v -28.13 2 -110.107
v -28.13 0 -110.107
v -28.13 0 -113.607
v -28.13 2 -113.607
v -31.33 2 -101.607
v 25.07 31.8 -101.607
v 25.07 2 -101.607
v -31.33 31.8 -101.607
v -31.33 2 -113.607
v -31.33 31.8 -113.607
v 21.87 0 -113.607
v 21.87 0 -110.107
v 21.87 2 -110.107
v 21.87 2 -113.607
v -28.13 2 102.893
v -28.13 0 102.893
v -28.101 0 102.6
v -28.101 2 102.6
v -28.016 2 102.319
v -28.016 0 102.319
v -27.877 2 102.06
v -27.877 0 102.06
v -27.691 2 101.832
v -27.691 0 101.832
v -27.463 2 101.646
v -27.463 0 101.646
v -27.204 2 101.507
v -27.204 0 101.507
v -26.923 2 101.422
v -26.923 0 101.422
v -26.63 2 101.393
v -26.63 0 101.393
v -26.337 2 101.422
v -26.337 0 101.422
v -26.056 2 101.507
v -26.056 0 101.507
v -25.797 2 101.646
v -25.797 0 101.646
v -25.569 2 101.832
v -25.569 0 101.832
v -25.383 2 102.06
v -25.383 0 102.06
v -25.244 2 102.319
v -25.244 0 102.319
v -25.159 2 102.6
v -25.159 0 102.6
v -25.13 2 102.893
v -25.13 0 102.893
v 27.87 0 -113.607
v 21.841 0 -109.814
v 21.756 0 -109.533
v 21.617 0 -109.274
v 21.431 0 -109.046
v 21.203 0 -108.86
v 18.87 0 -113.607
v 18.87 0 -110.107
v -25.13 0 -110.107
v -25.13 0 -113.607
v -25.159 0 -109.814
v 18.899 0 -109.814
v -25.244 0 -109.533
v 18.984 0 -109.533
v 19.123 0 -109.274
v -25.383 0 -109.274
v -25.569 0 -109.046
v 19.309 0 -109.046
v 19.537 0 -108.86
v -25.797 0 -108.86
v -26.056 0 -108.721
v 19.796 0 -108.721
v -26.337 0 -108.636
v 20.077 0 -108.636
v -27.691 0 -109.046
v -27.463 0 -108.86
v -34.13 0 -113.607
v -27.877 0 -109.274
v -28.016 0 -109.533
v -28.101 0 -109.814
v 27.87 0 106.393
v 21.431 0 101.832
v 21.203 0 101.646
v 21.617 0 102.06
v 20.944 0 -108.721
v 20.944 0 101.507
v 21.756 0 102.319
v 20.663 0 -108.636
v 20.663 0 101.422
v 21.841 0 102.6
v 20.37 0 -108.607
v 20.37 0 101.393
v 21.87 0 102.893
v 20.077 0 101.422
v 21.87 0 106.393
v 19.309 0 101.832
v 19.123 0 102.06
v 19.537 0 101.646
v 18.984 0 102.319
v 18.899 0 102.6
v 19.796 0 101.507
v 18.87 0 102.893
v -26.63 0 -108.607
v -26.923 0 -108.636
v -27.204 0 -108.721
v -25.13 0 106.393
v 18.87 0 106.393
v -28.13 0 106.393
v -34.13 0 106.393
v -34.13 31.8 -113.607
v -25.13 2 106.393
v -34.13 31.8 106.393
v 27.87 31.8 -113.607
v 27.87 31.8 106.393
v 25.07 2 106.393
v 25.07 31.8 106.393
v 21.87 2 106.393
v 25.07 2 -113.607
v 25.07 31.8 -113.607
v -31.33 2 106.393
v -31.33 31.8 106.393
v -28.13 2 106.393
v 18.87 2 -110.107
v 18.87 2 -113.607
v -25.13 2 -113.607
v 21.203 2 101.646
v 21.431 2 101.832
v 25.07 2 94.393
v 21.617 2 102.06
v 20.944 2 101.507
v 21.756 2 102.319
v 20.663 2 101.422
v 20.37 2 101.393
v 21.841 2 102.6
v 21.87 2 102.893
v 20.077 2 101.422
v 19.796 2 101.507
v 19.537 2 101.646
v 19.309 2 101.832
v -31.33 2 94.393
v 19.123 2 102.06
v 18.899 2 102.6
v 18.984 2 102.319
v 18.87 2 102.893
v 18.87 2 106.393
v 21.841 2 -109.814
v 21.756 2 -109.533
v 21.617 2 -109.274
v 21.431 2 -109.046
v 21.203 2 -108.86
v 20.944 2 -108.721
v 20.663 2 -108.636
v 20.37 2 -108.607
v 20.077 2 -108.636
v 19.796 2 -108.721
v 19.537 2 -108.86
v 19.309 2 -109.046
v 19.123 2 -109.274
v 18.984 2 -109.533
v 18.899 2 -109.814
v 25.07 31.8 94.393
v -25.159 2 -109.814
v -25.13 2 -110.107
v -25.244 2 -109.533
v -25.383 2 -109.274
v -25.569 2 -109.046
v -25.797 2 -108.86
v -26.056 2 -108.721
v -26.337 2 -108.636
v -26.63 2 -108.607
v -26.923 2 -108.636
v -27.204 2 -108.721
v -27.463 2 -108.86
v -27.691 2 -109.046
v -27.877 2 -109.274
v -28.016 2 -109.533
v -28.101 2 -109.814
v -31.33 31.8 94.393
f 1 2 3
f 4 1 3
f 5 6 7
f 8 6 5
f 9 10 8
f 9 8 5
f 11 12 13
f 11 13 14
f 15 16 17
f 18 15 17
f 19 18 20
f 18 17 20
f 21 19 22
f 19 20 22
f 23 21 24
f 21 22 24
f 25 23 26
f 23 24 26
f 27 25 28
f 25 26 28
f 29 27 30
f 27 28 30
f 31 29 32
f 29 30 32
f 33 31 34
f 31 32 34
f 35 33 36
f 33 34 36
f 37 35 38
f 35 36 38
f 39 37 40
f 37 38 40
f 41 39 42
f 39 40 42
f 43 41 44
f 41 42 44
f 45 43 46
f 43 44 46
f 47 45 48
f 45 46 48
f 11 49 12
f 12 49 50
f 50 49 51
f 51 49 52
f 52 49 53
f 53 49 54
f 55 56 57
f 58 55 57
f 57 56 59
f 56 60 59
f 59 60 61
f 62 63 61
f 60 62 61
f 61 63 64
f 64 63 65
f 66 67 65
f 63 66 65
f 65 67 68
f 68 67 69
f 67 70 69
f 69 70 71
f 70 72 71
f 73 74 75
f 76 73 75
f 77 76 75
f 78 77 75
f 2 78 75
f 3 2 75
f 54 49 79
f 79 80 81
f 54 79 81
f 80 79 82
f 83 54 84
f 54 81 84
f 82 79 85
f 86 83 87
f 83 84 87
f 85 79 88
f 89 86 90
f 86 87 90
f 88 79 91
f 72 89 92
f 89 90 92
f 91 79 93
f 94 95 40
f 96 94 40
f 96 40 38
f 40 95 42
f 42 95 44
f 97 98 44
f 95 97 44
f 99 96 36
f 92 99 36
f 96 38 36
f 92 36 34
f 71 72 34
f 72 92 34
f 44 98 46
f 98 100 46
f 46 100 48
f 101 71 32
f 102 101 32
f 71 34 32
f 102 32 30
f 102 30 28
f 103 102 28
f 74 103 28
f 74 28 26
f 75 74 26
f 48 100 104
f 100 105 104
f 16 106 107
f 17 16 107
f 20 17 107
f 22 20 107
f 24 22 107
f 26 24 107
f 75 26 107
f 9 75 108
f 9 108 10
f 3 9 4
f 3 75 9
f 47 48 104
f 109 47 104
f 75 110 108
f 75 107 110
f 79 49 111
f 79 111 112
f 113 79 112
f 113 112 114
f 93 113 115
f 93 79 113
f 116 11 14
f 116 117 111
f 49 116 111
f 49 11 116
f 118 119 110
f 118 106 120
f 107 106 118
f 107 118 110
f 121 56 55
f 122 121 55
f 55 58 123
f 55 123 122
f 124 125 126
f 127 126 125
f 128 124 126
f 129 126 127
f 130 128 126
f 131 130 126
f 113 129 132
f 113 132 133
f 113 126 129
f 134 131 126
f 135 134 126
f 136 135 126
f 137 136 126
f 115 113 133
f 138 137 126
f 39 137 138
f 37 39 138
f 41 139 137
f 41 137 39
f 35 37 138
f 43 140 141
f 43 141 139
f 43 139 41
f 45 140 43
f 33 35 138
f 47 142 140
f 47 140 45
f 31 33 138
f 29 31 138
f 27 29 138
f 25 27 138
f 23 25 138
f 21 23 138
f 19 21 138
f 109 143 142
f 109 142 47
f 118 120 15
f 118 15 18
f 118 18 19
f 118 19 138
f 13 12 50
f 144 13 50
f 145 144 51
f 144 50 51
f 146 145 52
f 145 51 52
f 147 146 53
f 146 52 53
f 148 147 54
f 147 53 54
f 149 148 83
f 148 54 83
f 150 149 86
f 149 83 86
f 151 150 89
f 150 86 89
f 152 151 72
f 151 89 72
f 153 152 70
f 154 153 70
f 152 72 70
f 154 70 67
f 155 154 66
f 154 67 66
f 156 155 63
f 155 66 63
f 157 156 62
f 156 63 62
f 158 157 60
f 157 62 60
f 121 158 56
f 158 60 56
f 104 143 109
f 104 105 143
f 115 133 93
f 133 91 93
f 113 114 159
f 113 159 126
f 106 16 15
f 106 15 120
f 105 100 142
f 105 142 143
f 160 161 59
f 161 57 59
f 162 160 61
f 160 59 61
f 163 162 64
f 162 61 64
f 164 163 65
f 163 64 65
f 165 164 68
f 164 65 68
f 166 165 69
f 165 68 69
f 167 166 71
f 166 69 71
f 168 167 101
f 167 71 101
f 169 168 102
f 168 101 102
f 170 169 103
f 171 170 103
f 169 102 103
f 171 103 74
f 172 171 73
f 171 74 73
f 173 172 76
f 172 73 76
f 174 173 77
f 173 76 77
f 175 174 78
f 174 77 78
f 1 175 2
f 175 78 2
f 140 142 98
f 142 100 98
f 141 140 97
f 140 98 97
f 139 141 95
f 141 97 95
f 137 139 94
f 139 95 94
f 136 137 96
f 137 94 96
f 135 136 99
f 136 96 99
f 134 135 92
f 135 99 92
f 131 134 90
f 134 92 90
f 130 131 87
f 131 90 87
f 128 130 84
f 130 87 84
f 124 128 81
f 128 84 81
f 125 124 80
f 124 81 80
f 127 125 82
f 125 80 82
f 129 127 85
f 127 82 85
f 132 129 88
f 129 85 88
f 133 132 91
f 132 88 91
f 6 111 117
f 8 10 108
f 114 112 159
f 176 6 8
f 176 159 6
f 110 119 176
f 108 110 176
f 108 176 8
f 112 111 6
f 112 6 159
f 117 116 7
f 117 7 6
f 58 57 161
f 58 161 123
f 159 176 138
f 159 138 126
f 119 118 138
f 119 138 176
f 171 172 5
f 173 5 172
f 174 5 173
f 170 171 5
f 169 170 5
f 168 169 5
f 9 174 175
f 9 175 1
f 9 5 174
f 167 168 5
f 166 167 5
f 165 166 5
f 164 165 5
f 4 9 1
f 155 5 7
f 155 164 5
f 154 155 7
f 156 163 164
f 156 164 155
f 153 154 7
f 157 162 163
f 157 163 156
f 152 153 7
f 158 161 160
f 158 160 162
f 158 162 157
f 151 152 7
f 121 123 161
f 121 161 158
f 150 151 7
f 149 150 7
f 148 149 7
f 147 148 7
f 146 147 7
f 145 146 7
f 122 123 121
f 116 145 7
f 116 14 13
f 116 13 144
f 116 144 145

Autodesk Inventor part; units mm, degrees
ref_plane "YZ Plane" through (0, 0, 0) normal (1, 0, 0) x (0, 1, 0)
ref_plane "XZ Plane" through (0, 0, 0) normal (0, 1, 0) x (-1, 0, 0)
sketch "Sketch1" plane through (0, 0, 0) normal (0, 1, 0) x (-1, 0, 0)
  line L0 (34.1299, -113.6069) -> (-27.8701, -113.6069)
  line L1 (-27.8701, -113.6069) -> (-27.8701, 106.3931)
  line L2 (-27.8701, 106.3931) -> (34.1299, 106.3931)
  line L3 (34.1299, 106.3931) -> (34.1299, -113.6069)
  line L4 (34.1299, -113.6069) -> (-27.8701, 106.3931) construction
  line L5 (-27.8701, -113.6069) -> (34.1299, 106.3931) construction
  point P0 (0, 0)
  point P1 (3.1299, -3.6069)
  dimension "d0" = 62
  dimension "d1" = 220
extrude "Extrusion1" add sketch "Sketch1" along normal blind 31.8
sketch "Sketch2" plane through (-34.1299, 0, 106.3931) normal (0, 0, 1) x (1, 0, 0)
  line L0 (62, 0) -> (0, 0) projected
  line L1 (62, 0) -> (62, 31.8) projected
  line L2 (0, 0) -> (0, 31.8) projected
  line L3 (2.8, 38.8076) -> (59.2, 38.8076)
  line L4 (59.2, 38.8076) -> (59.2, 2)
  line L5 (59.2, 2) -> (2.8, 2)
  line L6 (2.8, 2) -> (2.8, 38.8076)
  point P0 (34.1299, 0)
  dimension "d4" = 2.8
  dimension "d5" = 2.8
  dimension "d6" = 2
extrude "Extrusion2" cut sketch "Sketch2" against normal blind 12
ref_plane "Work Plane1" through (27.8701, 0, -3.6069) normal (0, 0, -1) x (-1, 0, 0)
mirror "Mirror1" about plane through (27.8701, 0, -3.6069) normal (0, 0, -1) of "Extrusion2"
sketch "Sketch3" plane through (0, 0, 0) normal (0, -1, 0) x (1, 0, 0)
  line L0 (-34.1299, -113.6069) -> (27.8701, -113.6069) projected
  line L1 (27.8701, -113.6069) -> (27.8701, 106.3931) projected
  line L2 (27.8701, 106.3931) -> (-34.1299, 106.3931) projected
  line L3 (-34.1299, 106.3931) -> (-34.1299, -113.6069) projected
  line L4 (-26.6299, 106.3931) -> (-26.6299, 102.8931)
  circle A0 centre (-26.6299, 102.8931) radius 1.5
  line L5 (-28.1299, 102.8931) -> (-28.1299, 106.3931)
  line L6 (-25.1299, 102.8931) -> (-25.1299, 106.3931)
  line L7 (20.3701, 106.3931) -> (20.3701, 102.8931)
  circle A1 centre (20.3701, 102.8931) radius 1.5
  line L8 (21.8701, 102.8931) -> (21.8701, 106.3931)
  line L9 (18.8701, 102.8931) -> (18.8701, 106.3931)
  line L10 (-26.6299, -113.6069) -> (-26.6299, -110.1069)
  circle A2 centre (-26.6299, -110.1069) radius 1.5
  line L11 (-25.1299, -110.1069) -> (-25.1299, -113.6069)
  line L12 (-28.1299, -110.1069) -> (-28.1299, -113.6069)
  line L13 (20.3701, -113.6069) -> (20.3701, -110.1069)
  circle A3 centre (20.3701, -110.1069) radius 1.5
  line L14 (18.8701, -110.1069) -> (18.8701, -113.6069)
  line L15 (21.8701, -110.1069) -> (21.8701, -113.6069)
  point P0 (0, 0)
  dimension "d9" = 3
  dimension "d10" = 3.5
  dimension "d11" = 6
  dimension "d12" = 3.5
  dimension "d14" = 3
  dimension "d15" = 3.5
  dimension "d16" = 3
  dimension "d18" = 3.5
  dimension "d19" = 3
  dimension "d23" = 6
  dimension "d24" = 6
  dimension "d25" = 6
extrude "Extrusion3" cut sketch "Sketch3" against normal blind 12 contours L12 A2 L10 L0 | L10 A2 L11 L0 | A2 | L2 L4 A0 L5 | L2 L6 A0 L4 | A0 | L14 A3 L13 L0 | L13 A3 L15 L0 | A3 | L2 L7 A1 L9 | L2 L8 A1 L7 | A1
properties part number "5v_psu"
